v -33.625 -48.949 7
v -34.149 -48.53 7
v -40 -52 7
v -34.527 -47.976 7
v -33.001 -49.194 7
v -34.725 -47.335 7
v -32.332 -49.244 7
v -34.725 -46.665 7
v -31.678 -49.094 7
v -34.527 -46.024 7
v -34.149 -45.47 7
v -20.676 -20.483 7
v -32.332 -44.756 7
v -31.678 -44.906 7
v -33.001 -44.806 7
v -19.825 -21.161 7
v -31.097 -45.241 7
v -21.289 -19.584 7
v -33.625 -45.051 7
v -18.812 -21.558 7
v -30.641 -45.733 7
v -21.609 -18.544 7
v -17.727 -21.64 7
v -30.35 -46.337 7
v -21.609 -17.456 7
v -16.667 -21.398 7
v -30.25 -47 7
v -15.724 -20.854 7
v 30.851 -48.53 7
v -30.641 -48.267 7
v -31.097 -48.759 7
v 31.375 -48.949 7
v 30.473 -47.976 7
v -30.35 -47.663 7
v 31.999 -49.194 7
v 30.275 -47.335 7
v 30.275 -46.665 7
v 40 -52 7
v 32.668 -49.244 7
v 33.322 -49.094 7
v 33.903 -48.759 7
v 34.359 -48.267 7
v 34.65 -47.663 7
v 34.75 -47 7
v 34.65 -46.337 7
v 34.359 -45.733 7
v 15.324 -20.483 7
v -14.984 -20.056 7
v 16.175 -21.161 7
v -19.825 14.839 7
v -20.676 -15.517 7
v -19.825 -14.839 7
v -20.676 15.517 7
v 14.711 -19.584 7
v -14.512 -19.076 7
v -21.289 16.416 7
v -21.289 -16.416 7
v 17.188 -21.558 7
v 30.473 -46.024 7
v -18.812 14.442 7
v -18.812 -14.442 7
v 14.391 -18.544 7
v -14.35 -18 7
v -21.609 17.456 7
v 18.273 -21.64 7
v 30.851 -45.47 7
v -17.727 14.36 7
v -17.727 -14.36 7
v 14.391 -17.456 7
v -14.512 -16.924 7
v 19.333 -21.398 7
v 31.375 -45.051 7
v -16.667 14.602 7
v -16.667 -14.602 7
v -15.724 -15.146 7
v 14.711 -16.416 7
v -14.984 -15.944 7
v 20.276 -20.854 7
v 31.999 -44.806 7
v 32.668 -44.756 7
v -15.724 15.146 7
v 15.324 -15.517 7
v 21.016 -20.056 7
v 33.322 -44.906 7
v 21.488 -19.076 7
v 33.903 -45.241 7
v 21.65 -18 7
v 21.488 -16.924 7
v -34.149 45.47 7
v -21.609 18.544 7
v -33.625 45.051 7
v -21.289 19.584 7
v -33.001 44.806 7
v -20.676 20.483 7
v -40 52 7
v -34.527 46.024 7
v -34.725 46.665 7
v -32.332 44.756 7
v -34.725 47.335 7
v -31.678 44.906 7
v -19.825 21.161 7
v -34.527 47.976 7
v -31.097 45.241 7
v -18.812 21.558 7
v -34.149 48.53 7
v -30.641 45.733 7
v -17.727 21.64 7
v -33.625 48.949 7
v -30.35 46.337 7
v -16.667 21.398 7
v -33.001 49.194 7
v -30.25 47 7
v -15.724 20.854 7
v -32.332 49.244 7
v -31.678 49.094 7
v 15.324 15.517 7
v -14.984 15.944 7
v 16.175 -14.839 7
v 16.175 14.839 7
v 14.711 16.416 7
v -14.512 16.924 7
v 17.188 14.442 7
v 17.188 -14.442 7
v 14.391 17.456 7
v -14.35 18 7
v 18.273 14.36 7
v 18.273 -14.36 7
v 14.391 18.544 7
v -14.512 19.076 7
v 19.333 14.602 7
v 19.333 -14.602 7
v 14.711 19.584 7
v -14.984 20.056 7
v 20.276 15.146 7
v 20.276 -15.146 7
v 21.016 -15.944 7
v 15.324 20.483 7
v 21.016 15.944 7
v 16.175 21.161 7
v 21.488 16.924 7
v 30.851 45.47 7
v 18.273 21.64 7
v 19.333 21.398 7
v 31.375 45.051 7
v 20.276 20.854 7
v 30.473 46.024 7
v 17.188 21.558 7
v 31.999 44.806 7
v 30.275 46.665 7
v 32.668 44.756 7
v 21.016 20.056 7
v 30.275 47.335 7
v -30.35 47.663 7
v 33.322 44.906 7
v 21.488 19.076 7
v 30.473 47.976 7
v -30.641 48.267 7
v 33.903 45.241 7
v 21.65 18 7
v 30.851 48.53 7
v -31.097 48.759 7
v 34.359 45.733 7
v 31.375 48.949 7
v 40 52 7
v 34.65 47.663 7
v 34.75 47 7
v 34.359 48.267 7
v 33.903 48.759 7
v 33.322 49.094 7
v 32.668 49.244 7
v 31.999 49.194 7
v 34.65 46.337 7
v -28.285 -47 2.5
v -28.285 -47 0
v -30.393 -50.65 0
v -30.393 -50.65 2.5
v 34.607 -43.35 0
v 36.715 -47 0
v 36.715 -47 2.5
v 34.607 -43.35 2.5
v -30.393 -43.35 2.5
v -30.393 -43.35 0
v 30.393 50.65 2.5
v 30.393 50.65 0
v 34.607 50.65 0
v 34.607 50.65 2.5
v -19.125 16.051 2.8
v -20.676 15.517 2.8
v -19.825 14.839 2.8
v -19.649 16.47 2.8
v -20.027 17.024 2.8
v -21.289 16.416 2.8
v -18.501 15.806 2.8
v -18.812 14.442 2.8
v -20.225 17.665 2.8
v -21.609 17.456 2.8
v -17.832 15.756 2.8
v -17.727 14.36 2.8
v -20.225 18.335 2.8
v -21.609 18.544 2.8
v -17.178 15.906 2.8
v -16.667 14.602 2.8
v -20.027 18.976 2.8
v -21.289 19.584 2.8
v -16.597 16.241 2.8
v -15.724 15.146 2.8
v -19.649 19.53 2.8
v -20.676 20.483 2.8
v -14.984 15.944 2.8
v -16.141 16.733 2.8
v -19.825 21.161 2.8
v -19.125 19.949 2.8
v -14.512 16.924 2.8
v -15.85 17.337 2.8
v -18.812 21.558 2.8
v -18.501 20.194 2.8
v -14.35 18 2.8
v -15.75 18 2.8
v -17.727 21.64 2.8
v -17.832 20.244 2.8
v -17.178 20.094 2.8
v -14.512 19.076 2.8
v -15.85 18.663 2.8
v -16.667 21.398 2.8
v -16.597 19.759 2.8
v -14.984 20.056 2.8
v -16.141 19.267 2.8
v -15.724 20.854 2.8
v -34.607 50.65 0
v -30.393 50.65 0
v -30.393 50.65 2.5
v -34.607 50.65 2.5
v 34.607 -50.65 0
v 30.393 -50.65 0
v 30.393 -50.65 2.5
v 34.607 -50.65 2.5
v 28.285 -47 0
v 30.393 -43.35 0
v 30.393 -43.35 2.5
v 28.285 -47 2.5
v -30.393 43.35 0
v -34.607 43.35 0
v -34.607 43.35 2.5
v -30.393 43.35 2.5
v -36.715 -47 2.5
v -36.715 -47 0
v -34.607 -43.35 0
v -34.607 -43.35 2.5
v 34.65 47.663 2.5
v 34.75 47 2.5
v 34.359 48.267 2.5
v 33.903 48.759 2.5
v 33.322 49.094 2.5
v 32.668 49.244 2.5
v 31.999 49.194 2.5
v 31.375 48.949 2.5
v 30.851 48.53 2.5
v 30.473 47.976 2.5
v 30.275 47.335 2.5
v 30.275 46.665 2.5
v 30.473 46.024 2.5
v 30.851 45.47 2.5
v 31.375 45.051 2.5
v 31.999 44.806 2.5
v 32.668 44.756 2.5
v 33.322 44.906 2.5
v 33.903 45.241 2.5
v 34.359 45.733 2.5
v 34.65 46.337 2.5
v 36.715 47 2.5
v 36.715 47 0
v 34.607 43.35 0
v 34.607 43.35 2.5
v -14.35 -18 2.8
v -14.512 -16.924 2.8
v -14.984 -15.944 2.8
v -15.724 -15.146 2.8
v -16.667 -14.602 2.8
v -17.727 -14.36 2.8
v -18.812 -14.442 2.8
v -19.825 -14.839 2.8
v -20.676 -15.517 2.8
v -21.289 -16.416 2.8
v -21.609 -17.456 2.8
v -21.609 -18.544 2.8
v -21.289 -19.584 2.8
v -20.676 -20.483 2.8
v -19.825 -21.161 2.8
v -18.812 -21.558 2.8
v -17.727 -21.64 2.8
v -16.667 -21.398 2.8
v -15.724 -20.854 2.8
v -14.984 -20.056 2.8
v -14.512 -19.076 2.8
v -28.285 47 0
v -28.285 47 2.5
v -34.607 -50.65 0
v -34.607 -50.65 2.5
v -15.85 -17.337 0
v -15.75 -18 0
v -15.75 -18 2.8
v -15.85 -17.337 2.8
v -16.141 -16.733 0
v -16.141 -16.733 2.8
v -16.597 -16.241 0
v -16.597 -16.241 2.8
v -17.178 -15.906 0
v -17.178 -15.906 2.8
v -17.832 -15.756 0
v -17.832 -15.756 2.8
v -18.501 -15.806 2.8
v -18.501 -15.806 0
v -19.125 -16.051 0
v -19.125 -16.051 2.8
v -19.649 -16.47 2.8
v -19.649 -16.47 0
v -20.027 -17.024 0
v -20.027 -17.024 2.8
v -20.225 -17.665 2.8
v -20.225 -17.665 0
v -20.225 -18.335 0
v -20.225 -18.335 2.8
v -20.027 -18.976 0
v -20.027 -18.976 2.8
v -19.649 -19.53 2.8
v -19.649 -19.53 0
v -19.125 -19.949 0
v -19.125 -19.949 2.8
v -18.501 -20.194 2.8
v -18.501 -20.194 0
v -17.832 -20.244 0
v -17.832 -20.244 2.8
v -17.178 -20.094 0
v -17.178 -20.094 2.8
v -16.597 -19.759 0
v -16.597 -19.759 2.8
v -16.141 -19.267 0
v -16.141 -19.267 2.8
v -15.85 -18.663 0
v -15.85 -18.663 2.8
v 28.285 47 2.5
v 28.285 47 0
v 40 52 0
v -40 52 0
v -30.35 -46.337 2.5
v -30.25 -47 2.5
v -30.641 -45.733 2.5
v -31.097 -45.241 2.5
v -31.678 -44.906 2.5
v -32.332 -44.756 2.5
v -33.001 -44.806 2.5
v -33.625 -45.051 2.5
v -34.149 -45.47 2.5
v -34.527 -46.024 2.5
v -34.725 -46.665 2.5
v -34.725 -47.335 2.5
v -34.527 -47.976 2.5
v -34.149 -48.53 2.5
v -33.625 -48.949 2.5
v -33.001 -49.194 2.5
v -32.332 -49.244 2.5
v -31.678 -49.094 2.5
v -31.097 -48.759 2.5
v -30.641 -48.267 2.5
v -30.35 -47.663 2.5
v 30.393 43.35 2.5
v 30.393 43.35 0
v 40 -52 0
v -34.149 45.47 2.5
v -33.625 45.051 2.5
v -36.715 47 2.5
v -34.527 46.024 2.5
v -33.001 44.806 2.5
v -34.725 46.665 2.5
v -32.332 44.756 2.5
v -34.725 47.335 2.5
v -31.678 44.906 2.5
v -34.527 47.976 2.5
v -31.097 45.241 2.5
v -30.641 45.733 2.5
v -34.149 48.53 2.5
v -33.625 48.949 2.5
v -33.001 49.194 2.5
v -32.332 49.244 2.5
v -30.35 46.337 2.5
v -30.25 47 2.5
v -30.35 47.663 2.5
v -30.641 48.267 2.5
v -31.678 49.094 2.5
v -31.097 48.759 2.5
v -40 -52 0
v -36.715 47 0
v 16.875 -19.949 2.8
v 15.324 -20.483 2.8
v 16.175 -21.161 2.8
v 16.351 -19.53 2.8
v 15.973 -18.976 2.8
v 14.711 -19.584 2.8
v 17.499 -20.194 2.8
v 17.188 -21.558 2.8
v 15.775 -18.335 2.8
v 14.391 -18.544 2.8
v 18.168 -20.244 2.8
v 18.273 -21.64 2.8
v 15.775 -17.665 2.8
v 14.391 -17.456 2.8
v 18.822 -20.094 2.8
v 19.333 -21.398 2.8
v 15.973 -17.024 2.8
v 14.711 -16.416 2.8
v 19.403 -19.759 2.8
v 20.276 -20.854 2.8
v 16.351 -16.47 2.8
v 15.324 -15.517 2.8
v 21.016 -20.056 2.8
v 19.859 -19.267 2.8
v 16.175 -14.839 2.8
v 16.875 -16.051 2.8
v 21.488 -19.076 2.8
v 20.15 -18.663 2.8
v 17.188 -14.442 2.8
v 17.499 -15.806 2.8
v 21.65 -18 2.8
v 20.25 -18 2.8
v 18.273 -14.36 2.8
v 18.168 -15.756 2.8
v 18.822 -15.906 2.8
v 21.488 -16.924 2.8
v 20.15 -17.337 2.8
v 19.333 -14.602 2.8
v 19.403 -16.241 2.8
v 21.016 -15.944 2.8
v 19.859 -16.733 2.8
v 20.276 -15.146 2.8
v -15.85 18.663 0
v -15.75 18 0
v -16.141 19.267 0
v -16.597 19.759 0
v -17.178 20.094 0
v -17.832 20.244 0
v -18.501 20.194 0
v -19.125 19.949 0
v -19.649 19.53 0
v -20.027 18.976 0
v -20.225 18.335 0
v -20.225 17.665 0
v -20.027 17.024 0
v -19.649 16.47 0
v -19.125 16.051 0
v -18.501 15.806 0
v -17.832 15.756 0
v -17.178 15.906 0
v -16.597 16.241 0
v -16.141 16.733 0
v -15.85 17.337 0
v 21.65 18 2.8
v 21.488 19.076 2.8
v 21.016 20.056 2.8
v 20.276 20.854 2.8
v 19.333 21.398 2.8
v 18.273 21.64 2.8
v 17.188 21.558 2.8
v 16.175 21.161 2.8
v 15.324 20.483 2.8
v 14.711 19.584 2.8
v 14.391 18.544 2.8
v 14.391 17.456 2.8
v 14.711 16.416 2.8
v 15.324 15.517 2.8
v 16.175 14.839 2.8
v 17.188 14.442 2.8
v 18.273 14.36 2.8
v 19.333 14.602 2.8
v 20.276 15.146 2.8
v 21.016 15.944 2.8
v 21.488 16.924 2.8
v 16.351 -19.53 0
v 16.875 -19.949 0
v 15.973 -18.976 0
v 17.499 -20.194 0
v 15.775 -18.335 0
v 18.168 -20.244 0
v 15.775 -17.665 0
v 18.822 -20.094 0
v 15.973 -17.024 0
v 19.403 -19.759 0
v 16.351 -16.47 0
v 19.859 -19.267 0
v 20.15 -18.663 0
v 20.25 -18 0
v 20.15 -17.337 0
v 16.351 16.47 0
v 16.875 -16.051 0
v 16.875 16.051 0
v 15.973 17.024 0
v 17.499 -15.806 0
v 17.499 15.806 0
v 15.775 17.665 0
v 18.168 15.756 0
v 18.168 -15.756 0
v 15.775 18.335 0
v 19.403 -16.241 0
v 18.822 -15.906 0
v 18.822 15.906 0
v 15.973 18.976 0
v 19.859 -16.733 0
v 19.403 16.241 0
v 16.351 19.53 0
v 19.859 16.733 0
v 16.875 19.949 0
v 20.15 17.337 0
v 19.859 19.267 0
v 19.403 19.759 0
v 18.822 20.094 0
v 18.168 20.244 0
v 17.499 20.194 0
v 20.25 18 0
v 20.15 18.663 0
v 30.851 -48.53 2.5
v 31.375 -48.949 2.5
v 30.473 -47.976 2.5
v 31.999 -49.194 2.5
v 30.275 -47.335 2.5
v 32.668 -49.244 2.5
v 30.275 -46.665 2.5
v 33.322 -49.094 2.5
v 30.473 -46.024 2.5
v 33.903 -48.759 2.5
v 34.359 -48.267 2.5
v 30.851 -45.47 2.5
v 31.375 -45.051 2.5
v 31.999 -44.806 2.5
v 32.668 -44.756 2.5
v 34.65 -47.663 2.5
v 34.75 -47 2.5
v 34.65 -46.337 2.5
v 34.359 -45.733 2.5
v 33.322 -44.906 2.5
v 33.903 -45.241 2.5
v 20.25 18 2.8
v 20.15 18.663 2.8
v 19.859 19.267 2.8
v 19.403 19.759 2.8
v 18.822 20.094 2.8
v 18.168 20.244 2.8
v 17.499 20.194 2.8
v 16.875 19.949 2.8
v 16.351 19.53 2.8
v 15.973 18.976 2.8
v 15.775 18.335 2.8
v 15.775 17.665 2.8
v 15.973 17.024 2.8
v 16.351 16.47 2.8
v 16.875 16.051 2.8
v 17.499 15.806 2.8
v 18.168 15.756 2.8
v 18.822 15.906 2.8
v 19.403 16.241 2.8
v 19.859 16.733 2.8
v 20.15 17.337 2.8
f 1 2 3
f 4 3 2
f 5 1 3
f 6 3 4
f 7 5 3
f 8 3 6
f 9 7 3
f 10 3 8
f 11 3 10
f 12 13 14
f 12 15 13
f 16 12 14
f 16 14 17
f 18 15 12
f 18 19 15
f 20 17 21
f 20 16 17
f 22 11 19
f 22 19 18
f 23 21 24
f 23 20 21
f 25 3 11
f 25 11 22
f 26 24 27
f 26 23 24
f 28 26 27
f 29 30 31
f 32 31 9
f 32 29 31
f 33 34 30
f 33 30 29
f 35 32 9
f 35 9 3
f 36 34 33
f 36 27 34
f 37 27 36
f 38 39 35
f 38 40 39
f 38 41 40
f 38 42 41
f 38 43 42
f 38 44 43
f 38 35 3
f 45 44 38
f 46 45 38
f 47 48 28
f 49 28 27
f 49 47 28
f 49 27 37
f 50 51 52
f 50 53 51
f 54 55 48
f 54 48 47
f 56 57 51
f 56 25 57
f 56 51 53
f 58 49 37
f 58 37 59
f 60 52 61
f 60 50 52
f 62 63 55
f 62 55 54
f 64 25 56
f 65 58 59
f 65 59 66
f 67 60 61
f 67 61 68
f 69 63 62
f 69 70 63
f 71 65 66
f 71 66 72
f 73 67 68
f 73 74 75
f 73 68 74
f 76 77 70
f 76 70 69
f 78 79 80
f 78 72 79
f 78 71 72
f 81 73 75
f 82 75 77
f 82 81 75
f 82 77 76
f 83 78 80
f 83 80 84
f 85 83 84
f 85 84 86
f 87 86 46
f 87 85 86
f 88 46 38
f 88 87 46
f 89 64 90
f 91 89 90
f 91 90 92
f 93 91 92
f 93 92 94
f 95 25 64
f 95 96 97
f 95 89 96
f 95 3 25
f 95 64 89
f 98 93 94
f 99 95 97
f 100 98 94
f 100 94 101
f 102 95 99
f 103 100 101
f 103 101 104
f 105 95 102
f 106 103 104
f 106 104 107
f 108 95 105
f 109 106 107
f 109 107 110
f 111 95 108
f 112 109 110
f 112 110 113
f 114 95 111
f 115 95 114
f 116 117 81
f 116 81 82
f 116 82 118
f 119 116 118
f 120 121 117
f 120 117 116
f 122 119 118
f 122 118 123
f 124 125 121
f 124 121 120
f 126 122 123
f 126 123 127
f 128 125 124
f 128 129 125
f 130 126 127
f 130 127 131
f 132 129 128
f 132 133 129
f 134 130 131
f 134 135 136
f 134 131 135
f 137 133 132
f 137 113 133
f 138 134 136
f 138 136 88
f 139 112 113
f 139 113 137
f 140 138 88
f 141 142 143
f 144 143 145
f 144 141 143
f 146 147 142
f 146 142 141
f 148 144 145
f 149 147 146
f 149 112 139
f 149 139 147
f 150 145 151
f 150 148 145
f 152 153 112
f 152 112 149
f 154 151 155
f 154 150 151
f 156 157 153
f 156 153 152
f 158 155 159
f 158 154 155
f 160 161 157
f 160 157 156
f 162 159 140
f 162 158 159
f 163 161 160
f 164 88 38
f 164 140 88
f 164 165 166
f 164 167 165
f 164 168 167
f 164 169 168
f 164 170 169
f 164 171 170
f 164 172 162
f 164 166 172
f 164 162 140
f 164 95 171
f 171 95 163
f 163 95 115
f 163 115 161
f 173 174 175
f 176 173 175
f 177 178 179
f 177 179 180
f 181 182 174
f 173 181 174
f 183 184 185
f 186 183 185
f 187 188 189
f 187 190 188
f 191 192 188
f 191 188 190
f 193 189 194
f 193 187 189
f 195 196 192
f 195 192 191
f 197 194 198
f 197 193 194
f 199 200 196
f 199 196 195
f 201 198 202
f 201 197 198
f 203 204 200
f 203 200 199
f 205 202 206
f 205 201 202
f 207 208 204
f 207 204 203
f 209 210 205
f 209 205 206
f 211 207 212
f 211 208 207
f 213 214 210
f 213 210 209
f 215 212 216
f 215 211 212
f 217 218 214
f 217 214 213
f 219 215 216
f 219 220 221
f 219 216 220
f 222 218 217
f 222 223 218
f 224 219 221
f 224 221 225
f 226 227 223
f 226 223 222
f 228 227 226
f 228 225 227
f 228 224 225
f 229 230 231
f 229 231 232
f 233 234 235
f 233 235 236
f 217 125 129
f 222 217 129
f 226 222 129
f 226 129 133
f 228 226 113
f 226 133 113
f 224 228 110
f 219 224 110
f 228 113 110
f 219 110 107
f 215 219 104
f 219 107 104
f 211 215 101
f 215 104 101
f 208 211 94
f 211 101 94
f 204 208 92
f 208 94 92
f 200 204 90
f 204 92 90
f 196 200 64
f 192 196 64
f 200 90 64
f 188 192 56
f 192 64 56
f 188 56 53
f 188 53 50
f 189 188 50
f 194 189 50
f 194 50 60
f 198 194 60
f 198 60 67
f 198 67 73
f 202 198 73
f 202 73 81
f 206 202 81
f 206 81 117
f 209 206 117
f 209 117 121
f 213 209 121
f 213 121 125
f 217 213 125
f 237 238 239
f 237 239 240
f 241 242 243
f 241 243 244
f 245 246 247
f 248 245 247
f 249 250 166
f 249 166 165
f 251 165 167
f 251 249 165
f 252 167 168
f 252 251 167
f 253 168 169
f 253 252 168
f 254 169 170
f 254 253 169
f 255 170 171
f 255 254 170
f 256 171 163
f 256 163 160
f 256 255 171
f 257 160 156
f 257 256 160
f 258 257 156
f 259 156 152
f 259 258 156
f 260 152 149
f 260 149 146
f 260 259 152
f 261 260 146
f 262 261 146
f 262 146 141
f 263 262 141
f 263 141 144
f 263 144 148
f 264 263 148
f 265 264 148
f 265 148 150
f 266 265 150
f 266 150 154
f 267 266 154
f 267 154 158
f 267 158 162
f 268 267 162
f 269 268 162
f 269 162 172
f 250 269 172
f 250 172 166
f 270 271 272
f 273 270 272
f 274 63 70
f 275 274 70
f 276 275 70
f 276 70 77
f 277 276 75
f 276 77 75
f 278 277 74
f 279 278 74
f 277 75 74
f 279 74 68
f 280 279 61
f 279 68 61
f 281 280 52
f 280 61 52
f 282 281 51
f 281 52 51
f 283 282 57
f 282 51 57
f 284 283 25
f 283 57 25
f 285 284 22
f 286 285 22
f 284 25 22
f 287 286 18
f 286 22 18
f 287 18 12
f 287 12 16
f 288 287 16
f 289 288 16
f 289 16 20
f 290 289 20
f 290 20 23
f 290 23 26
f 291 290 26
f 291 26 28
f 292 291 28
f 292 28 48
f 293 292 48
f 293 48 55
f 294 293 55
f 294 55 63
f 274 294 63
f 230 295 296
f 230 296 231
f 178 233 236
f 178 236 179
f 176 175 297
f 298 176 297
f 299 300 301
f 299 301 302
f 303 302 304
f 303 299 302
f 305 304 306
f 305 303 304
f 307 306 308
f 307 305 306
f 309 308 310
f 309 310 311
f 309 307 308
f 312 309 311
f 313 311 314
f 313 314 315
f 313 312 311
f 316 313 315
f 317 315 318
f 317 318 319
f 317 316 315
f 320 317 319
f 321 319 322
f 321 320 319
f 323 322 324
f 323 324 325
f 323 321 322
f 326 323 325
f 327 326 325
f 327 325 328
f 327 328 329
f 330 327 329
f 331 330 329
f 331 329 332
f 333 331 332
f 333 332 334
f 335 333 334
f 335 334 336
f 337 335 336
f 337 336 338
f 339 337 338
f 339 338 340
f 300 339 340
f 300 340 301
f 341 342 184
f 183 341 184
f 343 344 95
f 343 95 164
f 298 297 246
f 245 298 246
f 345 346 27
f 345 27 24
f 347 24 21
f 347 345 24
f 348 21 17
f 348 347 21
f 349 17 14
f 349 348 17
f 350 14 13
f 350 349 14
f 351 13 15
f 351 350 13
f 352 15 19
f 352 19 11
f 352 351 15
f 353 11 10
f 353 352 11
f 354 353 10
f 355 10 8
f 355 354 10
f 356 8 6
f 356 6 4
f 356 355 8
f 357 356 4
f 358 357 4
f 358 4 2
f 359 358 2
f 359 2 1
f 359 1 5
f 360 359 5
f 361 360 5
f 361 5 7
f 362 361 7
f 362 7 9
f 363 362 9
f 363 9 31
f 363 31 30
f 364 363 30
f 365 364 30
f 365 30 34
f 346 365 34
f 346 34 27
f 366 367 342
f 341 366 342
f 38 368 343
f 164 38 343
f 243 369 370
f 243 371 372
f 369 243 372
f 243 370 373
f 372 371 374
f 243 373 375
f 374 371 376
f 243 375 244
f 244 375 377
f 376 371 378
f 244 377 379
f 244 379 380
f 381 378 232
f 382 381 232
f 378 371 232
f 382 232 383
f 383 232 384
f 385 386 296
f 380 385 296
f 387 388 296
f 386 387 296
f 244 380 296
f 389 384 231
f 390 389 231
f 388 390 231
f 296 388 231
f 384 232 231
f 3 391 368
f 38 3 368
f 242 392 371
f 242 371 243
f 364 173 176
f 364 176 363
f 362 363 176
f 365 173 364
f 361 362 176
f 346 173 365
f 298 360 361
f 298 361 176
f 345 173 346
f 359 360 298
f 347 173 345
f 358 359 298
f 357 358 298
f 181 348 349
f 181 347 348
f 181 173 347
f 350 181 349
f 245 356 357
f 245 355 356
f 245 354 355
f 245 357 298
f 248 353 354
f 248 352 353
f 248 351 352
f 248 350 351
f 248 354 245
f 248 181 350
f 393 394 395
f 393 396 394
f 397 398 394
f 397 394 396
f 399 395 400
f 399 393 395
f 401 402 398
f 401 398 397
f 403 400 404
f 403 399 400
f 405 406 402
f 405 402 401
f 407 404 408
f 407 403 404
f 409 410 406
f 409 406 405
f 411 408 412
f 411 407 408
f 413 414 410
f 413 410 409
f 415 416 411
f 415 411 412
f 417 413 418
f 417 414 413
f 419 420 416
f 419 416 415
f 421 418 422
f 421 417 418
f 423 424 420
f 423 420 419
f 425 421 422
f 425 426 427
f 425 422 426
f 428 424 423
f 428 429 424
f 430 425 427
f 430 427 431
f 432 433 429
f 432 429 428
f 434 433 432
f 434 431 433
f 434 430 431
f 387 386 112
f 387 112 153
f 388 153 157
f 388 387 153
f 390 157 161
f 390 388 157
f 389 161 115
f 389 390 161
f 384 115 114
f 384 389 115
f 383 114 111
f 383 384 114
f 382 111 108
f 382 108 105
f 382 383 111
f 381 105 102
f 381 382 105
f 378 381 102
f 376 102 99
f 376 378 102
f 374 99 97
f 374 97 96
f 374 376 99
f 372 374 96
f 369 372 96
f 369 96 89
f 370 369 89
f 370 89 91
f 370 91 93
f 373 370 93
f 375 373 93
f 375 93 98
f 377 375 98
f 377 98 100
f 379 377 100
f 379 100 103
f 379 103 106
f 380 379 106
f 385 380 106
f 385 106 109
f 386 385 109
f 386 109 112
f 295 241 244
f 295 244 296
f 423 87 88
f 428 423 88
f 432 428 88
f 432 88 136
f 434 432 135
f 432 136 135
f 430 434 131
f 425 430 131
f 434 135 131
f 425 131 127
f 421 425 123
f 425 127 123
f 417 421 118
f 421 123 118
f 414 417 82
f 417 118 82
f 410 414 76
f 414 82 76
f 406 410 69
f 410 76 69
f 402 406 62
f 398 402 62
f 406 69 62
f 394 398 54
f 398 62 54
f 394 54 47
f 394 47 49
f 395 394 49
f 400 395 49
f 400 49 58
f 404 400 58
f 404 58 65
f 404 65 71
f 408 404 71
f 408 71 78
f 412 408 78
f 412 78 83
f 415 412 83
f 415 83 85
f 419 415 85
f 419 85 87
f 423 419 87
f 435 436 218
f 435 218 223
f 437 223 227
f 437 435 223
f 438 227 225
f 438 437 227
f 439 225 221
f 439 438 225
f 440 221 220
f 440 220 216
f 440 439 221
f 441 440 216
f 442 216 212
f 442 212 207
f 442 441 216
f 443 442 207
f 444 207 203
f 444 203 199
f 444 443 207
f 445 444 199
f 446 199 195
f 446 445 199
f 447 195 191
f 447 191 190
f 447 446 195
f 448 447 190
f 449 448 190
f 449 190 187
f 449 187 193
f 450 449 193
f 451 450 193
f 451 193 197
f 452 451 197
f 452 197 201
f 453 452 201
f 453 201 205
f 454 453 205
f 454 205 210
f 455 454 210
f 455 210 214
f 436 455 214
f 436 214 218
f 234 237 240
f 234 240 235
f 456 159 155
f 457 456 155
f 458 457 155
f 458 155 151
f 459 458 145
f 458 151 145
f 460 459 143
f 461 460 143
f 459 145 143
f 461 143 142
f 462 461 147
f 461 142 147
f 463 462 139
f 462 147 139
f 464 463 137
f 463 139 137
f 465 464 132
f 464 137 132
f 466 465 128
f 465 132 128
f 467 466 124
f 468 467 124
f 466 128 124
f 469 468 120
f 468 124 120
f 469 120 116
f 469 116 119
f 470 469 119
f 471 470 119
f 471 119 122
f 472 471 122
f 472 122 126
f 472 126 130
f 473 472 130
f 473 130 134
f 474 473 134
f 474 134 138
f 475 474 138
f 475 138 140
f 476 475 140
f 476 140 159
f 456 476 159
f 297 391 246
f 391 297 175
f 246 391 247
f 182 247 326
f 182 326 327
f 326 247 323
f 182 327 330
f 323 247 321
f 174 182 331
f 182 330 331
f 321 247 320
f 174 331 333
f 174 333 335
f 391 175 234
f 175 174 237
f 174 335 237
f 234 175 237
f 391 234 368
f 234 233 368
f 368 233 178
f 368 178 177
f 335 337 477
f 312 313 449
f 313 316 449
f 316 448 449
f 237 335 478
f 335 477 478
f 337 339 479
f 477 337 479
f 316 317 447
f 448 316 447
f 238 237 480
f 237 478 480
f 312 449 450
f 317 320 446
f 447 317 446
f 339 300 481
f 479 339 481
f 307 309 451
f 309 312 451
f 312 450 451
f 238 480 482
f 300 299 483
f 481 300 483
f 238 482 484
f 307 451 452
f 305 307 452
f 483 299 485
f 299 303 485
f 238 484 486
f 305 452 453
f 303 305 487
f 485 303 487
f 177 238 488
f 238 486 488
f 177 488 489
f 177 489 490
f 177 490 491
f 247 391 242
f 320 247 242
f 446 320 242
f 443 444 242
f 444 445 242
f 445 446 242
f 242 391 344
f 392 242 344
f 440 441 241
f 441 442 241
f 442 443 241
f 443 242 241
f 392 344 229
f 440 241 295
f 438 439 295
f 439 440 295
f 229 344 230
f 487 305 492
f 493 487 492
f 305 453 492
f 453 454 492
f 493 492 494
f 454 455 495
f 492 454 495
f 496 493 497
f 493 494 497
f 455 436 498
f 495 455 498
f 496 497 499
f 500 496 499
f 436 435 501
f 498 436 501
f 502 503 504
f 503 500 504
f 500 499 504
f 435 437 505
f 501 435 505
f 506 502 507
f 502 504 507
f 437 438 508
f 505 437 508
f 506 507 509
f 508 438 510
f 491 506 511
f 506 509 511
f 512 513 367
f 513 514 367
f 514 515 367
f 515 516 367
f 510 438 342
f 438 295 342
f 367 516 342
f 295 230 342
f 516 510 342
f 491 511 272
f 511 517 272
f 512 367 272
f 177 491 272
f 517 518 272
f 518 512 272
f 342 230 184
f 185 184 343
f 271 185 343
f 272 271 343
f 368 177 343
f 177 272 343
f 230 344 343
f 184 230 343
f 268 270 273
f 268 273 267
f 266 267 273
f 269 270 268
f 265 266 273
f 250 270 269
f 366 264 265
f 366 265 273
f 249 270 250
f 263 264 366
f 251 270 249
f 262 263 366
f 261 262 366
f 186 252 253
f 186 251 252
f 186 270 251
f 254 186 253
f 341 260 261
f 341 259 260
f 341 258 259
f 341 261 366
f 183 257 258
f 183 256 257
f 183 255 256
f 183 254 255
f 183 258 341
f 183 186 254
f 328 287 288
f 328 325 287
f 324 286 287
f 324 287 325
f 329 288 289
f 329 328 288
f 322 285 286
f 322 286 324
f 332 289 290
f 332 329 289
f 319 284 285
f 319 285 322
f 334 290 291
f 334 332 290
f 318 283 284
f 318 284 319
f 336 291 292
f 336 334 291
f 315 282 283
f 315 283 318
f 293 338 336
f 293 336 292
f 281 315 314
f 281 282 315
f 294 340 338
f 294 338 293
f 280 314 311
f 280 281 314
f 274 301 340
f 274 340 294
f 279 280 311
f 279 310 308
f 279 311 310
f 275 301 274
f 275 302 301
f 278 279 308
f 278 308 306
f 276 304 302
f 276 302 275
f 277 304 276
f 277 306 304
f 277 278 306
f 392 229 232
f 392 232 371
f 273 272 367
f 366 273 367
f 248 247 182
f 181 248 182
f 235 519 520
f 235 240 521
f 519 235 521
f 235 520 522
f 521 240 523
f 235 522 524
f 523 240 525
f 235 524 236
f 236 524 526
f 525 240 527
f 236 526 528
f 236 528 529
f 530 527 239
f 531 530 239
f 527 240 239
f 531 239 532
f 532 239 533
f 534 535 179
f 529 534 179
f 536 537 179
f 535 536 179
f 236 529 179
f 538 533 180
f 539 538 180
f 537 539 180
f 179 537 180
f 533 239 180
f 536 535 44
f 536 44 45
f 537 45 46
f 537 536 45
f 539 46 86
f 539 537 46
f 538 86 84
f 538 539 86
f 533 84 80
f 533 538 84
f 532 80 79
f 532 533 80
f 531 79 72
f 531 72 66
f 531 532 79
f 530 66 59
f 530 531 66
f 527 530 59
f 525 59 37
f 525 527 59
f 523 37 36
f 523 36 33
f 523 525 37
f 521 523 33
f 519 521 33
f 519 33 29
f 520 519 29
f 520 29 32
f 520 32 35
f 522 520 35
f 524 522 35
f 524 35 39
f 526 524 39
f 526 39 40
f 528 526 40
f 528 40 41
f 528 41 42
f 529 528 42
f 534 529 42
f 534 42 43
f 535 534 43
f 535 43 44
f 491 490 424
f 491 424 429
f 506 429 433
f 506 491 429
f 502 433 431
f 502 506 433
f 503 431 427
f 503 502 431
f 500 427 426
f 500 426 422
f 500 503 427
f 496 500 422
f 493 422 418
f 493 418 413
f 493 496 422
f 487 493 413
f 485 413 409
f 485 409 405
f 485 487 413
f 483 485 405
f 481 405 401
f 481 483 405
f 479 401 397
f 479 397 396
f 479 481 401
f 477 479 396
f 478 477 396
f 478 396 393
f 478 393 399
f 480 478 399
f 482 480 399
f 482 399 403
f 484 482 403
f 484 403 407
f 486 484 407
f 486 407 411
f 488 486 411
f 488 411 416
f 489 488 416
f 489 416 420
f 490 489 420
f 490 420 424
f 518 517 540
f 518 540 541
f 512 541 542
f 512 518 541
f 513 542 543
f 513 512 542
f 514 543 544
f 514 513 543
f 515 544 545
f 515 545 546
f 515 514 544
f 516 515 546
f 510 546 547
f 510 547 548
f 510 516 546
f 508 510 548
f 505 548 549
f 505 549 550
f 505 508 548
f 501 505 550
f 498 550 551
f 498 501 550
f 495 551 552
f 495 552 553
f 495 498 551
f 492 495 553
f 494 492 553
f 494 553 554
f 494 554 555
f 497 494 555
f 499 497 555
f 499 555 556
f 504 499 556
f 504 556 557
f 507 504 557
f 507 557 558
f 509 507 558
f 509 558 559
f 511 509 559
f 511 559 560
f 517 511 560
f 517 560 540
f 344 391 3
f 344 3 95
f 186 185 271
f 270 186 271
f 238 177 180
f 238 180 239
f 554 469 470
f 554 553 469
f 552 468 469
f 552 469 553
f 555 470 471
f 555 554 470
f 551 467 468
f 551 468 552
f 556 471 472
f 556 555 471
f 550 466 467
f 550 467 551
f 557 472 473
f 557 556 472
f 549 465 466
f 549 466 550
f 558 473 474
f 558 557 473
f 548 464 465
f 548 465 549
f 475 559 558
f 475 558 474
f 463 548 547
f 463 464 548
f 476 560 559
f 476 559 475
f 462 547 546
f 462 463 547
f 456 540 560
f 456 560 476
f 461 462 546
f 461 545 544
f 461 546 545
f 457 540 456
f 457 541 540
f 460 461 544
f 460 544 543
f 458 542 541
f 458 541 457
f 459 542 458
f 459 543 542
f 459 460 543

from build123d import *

# Parameters (mm, degrees)
SKETCH_2_W                = 80
SKETCH_2_H                = 104
SKETCH_2_R                = 2.25
EXTRUDE_1_DEPTH           = 7
HOLE_WIZARD_1_D           = 4.5
HOLE_WIZARD_1_CBORE_D     = 7.3
HOLE_WIZARD_1_CBORE_DEPTH = 4.2
CUT_EXTRUDE_1_DEPTH       = 2.5


with BuildPart() as part:
    # 草圖2 → 填料-伸長1 (new body)
    with BuildSketch(Plane.XY):
        Rectangle(SKETCH_2_W, SKETCH_2_H)
        with Locations((-18, 18)):
            Circle(SKETCH_2_R, mode=Mode.SUBTRACT)
        with Locations((-32.5, 47)):
            Circle(SKETCH_2_R, mode=Mode.SUBTRACT)
        with Locations((18, 18)):
            Circle(SKETCH_2_R, mode=Mode.SUBTRACT)
        with Locations((18, -18)):
            Circle(SKETCH_2_R, mode=Mode.SUBTRACT)
        with Locations((-18, -18)):
            Circle(SKETCH_2_R, mode=Mode.SUBTRACT)
        with Locations((32.5, 47)):
            Circle(SKETCH_2_R, mode=Mode.SUBTRACT)
        with Locations((32.5, -47)):
            Circle(SKETCH_2_R, mode=Mode.SUBTRACT)
        with Locations((-32.5, -47)):
            Circle(SKETCH_2_R, mode=Mode.SUBTRACT)
    extrude(amount=EXTRUDE_1_DEPTH)

    # 鑽孔1 (through all)
    with Locations(Plane(origin=(-18, 18, 7), x_dir=(1, 0, 0), z_dir=(0, 0, 1))):
        with Locations((0, 0), (36, 0), (36, -36), (0, -36)):
            CounterBoreHole(HOLE_WIZARD_1_D / 2, HOLE_WIZARD_1_CBORE_D / 2, HOLE_WIZARD_1_CBORE_DEPTH)

    # 草圖4 → 除料-伸長1 (cut)
    with BuildSketch(Plane(origin=(0, 0, 0), x_dir=(-1, 0, 0), z_dir=(0, 0, -1))):
        Polygon((-28.285343035, 47), (-30.392671517, 50.65), (-34.607328483, 50.65), (-36.714656965, 47), (-34.607328483, 43.35), (-30.392671517, 43.35), align=None)
        Polygon((30.392671517, 43.35), (28.285343035, 47), (30.392671517, 50.65), (34.607328483, 50.65), (36.714656965, 47), (34.607328483, 43.35), align=None)
        Polygon((28.285343035, -47), (30.392671517, -50.65), (34.607328483, -50.65), (36.714656965, -47), (34.607328483, -43.35), (30.392671517, -43.35), align=None)
        Polygon((-30.392671517, -43.35), (-28.285343035, -47), (-30.392671517, -50.65), (-34.607328483, -50.65), (-36.714656965, -47), (-34.607328483, -43.35), align=None)
    extrude(amount=-CUT_EXTRUDE_1_DEPTH, mode=Mode.SUBTRACT)


solid = part.part
